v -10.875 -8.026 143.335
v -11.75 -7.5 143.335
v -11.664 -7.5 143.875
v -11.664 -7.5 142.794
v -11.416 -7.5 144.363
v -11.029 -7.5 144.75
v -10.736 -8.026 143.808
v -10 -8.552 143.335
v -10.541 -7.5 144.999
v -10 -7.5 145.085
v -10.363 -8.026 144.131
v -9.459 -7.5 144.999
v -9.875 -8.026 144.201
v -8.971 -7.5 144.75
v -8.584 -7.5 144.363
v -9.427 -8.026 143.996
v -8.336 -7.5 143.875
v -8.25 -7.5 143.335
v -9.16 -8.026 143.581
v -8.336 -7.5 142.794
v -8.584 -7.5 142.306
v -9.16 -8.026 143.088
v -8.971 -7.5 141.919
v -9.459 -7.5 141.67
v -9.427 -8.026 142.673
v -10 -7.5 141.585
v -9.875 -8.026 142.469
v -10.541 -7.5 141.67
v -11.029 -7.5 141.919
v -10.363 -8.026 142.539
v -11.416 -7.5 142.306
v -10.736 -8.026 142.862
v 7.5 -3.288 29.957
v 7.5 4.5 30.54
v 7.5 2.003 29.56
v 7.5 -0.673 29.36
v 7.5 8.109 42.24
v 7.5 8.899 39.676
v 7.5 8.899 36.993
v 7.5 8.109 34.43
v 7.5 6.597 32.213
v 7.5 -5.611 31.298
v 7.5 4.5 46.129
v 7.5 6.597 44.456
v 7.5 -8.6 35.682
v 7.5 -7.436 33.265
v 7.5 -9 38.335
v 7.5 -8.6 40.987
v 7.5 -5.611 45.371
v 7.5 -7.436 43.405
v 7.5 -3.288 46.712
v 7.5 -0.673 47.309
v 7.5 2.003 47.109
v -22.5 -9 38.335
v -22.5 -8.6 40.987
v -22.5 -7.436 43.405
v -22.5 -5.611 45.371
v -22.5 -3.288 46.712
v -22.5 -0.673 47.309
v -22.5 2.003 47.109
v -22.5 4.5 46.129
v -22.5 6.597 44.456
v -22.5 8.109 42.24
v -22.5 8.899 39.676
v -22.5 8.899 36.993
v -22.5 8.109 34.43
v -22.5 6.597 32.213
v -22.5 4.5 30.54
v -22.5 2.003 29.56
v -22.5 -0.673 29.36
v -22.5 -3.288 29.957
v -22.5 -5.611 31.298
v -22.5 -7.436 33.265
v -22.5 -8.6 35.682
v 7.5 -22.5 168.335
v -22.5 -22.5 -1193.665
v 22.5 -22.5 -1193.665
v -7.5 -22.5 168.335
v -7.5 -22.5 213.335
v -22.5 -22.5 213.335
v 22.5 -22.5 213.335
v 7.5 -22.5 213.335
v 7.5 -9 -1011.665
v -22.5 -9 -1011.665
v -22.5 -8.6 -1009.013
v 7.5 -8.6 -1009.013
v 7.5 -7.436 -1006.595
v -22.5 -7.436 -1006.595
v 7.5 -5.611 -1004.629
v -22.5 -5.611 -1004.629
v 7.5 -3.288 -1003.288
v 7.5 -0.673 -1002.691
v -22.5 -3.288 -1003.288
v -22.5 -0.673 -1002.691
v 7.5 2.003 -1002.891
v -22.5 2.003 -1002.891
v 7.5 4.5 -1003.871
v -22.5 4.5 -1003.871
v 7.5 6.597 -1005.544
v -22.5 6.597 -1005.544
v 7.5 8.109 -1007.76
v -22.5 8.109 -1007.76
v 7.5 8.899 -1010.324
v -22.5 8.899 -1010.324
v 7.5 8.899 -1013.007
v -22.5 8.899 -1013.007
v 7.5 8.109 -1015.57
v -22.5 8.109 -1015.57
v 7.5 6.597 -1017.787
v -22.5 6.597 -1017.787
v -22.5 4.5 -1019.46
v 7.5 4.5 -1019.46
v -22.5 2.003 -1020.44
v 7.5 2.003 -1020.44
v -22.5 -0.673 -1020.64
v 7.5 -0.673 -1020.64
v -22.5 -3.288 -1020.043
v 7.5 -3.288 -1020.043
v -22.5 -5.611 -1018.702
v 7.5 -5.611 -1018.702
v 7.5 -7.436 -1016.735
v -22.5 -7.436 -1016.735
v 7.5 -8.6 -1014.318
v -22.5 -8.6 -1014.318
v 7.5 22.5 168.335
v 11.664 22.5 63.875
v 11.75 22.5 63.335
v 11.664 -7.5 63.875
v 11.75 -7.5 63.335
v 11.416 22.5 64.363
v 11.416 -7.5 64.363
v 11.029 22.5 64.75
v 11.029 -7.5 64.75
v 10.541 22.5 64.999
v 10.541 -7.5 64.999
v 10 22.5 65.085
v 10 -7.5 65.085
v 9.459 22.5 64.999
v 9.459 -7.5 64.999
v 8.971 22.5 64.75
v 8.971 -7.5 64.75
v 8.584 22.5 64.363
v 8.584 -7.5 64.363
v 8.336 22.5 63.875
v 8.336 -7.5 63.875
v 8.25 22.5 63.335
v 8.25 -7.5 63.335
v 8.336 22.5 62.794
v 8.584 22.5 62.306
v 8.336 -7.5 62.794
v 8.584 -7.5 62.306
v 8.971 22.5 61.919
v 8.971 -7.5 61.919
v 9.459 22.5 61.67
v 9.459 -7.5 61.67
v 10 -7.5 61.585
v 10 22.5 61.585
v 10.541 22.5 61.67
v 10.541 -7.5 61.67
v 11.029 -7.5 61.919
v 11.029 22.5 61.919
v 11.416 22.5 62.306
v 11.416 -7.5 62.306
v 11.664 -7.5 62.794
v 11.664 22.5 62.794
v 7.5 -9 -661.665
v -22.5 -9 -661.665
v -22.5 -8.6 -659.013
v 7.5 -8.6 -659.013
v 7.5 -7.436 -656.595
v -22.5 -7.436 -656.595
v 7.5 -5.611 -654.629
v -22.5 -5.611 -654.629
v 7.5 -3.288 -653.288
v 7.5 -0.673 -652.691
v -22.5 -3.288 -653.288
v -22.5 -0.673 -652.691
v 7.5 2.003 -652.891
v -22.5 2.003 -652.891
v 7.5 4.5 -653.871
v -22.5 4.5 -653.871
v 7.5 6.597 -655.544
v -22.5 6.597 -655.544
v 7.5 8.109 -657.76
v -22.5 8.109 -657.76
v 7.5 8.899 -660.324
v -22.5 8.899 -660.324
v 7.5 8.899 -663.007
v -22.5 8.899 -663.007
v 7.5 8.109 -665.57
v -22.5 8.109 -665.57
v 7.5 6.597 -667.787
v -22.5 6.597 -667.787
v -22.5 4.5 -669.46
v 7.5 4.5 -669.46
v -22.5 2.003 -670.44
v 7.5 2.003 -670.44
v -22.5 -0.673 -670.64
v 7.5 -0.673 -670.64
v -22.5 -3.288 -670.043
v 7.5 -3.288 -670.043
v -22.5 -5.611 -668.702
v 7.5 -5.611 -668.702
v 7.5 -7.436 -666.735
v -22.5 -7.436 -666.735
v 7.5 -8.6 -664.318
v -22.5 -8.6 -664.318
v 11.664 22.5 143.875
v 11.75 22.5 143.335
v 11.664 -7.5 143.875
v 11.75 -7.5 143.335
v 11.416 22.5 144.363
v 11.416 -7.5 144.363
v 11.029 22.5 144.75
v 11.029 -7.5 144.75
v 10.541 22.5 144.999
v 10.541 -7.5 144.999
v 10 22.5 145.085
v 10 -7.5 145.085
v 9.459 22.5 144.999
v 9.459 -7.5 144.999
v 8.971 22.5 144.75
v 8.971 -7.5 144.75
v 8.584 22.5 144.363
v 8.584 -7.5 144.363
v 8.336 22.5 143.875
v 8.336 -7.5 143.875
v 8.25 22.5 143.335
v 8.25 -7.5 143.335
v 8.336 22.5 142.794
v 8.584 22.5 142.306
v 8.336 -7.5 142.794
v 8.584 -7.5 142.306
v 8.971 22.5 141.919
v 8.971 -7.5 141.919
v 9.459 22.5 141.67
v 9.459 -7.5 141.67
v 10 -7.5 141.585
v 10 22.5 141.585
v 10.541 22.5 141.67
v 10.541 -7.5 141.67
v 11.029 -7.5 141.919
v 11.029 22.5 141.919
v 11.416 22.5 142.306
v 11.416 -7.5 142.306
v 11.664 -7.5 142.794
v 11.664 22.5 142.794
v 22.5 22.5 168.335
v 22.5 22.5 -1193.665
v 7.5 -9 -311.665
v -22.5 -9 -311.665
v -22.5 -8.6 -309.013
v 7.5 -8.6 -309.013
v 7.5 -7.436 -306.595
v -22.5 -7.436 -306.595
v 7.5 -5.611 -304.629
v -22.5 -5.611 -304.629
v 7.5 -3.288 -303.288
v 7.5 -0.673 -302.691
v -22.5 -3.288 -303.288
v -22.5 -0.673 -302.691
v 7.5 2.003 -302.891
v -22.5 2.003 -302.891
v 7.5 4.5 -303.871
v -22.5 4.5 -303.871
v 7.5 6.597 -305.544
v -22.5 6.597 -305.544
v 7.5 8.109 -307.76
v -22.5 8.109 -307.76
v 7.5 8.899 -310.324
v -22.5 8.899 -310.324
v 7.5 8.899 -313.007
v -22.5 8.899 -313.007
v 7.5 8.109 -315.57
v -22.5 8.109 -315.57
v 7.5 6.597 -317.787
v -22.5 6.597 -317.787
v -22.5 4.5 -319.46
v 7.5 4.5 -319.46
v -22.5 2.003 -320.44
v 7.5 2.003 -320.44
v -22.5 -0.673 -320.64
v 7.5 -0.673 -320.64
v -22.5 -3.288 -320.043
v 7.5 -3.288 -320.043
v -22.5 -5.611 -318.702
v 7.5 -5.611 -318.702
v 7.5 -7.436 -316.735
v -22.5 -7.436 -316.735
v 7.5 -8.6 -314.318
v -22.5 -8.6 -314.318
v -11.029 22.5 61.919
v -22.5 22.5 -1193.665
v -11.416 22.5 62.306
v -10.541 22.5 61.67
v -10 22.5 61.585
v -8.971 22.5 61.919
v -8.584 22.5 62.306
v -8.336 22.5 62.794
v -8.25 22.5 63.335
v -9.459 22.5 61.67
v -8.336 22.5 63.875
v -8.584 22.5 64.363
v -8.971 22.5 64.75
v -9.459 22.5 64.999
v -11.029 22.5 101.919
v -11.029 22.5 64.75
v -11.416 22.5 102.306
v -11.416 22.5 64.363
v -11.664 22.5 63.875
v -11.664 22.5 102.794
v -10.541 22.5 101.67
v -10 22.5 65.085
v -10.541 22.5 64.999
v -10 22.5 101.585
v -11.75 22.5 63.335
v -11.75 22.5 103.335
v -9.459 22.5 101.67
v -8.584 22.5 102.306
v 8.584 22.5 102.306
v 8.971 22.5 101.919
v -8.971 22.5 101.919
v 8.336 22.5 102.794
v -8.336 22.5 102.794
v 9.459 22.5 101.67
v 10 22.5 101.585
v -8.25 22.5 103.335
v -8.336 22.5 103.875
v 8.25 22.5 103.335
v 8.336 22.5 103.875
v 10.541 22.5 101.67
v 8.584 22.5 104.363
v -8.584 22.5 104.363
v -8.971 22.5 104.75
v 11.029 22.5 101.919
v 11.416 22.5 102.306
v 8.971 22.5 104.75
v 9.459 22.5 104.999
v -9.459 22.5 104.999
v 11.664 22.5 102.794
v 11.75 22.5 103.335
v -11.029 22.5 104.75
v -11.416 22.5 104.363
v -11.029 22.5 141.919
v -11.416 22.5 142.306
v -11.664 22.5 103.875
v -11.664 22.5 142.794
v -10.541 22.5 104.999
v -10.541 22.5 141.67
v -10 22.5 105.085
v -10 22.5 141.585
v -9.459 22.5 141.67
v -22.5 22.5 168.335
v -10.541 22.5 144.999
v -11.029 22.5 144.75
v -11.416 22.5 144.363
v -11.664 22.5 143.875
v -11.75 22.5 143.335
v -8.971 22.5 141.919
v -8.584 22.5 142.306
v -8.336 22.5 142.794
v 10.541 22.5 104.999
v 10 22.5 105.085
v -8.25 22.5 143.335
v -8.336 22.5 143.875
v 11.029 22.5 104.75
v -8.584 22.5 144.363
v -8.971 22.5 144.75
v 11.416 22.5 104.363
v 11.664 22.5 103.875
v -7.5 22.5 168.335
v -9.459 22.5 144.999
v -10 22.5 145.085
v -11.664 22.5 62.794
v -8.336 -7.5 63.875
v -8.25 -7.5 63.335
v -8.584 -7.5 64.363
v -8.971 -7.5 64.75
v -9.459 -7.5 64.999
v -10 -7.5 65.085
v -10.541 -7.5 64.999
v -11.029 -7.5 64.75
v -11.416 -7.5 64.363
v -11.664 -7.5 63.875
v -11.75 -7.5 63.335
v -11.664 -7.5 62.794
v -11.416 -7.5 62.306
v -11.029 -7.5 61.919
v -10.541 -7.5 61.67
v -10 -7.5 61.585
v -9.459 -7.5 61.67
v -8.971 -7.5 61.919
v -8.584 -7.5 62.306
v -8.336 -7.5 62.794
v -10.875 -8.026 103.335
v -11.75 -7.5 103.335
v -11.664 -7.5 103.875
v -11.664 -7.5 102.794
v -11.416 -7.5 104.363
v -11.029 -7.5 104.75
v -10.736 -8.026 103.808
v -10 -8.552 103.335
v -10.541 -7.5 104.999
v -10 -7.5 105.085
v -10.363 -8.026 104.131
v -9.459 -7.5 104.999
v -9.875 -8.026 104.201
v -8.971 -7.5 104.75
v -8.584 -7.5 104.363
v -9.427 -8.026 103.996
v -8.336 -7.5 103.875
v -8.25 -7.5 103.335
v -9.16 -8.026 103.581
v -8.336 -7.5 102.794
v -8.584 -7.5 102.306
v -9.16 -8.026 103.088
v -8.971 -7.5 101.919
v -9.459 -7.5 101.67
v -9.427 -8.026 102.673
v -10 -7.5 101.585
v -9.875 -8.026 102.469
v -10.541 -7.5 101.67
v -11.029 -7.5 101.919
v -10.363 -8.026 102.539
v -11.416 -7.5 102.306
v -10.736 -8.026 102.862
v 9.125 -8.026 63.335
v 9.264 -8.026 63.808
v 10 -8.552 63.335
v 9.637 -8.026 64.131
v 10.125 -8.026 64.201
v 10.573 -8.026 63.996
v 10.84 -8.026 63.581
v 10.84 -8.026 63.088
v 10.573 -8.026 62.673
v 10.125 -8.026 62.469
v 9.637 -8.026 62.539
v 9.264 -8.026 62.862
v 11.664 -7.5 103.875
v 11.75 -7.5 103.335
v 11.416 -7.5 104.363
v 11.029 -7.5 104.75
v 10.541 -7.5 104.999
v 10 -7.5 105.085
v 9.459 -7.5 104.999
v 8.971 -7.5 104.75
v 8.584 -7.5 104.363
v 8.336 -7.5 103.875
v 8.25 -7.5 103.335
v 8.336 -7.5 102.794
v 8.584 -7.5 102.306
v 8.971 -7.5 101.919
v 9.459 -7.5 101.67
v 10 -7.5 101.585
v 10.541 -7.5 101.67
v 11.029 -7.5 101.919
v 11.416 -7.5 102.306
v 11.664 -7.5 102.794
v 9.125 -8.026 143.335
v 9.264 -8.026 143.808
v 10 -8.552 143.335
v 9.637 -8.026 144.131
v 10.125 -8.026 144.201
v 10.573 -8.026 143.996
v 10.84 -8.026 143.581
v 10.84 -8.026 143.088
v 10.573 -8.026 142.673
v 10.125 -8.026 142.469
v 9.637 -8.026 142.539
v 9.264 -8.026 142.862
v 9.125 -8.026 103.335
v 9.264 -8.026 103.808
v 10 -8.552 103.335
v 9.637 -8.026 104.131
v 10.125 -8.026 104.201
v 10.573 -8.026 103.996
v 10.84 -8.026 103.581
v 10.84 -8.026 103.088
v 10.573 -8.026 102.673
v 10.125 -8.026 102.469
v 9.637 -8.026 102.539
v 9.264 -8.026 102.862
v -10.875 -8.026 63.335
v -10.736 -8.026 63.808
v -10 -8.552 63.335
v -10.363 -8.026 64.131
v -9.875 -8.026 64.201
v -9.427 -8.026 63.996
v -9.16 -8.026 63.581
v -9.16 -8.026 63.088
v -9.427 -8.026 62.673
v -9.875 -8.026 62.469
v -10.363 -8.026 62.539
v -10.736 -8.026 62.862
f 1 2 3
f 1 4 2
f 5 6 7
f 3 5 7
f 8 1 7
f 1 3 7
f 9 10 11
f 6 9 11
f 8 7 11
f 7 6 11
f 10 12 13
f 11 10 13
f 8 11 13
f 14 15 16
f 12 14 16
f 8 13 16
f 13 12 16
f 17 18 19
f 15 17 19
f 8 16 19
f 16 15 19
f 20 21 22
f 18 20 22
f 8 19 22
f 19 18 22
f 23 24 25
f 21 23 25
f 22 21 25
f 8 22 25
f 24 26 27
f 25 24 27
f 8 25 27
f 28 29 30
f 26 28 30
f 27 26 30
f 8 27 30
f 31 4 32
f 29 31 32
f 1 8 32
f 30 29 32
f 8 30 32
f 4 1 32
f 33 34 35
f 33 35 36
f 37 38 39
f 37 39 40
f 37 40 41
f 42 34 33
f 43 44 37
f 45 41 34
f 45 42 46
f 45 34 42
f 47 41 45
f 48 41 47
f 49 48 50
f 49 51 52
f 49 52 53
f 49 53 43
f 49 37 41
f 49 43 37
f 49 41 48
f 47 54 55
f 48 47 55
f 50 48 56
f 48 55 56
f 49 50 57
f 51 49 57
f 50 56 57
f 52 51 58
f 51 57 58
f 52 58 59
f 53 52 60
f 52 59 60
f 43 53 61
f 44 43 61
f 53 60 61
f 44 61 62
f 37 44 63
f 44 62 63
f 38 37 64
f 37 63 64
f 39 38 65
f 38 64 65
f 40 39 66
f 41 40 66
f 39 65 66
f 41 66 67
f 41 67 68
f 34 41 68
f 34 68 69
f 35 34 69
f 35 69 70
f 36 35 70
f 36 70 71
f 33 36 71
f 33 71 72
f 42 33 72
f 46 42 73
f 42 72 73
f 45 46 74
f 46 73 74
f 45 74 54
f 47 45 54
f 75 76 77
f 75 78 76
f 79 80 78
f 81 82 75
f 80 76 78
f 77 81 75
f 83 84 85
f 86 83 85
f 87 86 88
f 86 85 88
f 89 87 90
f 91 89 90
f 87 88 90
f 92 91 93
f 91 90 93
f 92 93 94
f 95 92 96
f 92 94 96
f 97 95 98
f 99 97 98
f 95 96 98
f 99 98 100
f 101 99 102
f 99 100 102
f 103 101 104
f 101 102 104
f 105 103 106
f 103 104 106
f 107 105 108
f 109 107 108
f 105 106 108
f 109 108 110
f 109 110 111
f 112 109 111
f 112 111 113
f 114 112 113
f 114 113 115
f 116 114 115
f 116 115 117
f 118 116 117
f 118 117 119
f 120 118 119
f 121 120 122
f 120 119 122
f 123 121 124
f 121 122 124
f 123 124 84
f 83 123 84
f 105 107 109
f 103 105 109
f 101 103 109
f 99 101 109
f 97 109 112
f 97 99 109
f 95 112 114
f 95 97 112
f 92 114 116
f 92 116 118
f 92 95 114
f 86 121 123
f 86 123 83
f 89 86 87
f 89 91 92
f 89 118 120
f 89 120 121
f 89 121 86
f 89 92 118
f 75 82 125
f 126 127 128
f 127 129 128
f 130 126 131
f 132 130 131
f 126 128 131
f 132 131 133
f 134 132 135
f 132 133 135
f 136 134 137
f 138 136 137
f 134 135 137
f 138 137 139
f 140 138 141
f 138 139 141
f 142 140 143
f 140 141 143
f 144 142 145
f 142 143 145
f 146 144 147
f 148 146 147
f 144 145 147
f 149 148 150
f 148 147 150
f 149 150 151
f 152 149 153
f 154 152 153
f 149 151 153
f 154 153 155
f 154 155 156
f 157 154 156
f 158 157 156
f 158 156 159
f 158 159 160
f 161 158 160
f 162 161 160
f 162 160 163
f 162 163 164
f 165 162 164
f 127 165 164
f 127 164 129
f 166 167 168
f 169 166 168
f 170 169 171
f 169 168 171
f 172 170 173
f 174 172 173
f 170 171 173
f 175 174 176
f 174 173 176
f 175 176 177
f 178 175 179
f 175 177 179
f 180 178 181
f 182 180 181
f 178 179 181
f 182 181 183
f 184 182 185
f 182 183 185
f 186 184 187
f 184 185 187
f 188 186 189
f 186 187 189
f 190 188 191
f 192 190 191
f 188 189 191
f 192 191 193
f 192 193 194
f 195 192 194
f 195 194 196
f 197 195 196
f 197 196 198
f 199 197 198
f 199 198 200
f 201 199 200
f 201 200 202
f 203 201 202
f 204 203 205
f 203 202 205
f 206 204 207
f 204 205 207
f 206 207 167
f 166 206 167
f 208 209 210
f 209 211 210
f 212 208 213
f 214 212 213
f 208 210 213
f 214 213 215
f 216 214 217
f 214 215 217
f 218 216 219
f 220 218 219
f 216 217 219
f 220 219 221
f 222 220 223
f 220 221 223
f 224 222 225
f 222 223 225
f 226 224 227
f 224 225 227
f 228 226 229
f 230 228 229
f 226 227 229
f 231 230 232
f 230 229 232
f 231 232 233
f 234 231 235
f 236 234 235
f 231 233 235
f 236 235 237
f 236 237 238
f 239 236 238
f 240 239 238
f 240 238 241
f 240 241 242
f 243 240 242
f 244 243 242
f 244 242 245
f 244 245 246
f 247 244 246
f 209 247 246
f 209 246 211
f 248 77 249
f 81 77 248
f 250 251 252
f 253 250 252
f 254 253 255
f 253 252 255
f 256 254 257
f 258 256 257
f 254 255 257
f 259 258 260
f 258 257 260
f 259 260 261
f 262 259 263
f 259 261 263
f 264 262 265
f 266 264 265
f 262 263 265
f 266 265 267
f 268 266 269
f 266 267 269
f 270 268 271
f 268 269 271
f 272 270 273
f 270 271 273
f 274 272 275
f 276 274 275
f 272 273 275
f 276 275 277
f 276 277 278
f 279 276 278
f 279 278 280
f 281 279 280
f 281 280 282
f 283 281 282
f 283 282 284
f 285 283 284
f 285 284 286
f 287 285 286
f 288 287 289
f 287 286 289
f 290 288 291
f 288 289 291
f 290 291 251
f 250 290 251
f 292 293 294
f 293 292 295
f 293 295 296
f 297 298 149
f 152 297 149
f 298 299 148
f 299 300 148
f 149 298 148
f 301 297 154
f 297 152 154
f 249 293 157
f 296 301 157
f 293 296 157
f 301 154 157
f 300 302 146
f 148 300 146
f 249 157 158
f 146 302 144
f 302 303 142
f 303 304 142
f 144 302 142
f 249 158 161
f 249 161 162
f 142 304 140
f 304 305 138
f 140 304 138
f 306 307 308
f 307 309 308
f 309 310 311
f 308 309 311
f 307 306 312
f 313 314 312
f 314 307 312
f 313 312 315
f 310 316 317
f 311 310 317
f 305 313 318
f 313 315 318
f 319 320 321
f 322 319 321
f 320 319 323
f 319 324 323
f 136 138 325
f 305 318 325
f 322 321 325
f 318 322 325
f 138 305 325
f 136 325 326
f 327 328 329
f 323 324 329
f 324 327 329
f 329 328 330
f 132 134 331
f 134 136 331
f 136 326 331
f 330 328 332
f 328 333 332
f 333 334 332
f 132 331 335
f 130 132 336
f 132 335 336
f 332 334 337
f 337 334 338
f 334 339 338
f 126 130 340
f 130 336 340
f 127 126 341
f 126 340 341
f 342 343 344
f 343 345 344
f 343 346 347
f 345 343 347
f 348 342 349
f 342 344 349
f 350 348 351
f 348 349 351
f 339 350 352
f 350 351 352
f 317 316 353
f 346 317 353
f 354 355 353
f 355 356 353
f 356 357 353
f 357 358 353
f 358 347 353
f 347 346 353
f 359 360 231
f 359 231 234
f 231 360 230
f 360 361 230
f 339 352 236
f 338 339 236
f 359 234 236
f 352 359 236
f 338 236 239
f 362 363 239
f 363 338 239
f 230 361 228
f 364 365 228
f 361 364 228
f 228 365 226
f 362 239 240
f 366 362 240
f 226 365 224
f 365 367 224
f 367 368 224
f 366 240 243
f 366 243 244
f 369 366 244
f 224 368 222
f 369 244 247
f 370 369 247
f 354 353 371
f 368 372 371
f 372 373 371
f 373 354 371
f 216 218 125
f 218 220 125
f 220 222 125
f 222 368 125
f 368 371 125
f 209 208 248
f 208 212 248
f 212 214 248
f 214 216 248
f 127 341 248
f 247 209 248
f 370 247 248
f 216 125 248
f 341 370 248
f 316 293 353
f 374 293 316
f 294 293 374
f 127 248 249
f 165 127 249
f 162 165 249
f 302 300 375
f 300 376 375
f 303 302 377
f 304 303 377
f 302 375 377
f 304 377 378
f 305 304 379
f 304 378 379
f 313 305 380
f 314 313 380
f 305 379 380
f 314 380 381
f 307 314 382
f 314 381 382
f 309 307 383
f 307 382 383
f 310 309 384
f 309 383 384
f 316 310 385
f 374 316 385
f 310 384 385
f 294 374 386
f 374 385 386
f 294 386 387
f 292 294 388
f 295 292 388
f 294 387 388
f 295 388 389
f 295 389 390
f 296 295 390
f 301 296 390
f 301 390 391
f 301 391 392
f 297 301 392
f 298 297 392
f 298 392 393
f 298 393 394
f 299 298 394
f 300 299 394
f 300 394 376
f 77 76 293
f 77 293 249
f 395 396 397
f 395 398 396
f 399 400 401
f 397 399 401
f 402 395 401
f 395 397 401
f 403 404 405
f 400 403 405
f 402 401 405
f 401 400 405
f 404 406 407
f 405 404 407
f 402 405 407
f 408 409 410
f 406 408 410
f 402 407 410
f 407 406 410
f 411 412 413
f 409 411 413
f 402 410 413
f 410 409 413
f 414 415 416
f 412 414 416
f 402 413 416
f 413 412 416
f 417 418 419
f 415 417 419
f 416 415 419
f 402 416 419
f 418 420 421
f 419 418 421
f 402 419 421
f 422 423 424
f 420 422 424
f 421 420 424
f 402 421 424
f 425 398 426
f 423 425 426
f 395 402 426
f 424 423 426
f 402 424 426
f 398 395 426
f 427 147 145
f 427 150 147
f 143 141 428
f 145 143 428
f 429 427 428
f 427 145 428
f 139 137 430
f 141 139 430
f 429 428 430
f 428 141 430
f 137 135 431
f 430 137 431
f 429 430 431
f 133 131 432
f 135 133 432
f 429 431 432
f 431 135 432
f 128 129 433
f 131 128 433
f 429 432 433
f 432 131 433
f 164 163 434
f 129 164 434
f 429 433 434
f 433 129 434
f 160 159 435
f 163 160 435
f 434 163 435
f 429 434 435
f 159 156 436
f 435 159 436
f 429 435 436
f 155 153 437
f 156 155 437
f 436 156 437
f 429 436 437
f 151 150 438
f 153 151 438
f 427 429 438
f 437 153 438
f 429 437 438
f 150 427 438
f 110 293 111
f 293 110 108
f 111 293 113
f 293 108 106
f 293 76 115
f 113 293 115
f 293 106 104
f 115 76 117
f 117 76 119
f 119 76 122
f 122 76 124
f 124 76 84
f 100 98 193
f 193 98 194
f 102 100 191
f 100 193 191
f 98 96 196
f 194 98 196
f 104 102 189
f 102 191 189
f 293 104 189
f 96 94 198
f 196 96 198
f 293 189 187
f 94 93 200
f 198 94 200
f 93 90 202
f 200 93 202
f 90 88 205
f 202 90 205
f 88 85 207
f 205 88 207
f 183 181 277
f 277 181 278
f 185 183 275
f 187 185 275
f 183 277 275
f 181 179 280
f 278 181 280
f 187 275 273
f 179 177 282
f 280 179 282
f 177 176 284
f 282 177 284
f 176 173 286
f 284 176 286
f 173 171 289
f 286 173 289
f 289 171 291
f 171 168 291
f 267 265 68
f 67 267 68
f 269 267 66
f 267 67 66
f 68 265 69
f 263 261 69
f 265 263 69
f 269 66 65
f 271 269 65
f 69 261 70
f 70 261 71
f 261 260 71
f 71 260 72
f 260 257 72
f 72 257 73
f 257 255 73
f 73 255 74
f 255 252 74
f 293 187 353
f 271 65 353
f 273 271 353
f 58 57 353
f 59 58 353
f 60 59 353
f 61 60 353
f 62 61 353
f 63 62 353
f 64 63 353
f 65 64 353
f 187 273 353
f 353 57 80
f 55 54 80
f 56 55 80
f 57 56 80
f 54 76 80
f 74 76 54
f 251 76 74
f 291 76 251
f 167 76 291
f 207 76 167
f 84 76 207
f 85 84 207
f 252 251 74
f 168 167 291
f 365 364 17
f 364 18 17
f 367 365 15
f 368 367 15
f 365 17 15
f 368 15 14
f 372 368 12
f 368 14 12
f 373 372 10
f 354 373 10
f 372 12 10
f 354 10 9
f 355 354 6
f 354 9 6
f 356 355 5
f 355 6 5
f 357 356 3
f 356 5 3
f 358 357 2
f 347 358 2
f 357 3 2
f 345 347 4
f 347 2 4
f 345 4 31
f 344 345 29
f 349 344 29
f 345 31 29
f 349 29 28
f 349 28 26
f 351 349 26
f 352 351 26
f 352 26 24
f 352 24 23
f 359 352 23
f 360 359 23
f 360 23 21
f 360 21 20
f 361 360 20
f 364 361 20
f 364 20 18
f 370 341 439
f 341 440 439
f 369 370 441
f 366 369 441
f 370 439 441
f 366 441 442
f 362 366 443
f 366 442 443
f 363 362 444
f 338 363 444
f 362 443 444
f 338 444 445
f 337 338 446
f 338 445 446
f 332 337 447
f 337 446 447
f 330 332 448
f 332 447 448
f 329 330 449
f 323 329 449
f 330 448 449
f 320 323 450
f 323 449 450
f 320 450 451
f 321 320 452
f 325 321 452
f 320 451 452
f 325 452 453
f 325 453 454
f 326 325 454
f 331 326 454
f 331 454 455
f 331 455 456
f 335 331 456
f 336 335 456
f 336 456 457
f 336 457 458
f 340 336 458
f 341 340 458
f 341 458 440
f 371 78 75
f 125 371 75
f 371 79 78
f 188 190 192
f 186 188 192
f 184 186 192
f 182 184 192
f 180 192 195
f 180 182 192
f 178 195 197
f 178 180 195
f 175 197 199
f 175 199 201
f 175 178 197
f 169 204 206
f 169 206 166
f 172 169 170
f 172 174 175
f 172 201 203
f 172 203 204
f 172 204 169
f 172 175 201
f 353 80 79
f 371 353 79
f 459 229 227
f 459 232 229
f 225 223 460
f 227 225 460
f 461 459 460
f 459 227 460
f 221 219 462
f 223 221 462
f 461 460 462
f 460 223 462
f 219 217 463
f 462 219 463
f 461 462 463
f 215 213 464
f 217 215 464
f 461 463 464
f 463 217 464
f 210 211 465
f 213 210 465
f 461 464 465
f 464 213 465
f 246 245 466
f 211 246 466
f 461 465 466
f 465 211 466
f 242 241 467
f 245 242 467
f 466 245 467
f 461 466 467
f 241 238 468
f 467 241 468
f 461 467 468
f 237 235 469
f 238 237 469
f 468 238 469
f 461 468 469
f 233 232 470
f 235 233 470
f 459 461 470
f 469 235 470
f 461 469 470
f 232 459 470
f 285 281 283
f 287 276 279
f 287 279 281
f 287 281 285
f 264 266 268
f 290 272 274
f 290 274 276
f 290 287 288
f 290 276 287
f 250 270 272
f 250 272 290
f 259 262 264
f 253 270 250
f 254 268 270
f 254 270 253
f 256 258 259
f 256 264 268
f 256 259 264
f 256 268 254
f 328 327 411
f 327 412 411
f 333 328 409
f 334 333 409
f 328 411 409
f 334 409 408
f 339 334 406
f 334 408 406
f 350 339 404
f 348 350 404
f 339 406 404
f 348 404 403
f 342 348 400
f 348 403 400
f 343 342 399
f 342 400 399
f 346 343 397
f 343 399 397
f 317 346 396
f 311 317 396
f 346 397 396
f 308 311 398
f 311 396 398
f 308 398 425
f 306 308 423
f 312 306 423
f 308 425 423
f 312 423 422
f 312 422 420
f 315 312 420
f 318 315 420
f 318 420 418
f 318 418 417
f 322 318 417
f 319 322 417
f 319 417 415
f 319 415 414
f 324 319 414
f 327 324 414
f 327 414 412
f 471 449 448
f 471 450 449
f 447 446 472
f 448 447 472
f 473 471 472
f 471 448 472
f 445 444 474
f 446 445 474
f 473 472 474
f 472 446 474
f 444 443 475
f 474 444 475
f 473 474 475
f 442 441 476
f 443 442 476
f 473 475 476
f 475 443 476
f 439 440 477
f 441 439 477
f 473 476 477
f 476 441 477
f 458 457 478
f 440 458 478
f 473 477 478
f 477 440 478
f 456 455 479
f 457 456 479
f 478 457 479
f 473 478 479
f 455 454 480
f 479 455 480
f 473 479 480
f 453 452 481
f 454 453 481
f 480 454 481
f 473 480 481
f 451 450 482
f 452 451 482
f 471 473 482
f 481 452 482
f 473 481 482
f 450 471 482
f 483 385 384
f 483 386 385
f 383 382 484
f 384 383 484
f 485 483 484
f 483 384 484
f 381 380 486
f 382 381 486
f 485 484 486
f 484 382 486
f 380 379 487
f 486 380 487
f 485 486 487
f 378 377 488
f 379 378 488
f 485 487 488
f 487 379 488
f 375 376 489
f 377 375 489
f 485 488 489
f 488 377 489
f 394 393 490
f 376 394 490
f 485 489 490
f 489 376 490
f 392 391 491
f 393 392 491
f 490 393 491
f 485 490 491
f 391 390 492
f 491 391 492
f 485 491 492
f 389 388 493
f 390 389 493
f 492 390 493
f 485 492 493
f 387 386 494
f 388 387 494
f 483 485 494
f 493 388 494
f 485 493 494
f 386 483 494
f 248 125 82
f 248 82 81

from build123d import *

# Parameters (mm, degrees)
F0_W     = 45
F0_H     = 1407
F1_DEPTH = 22.5
F3_SIZE2 = 44.99999
F3_SIZE  = 44.99999
F2_W     = 15
F2_H     = 45
F4_DEPTH = 45
F5_R     = 9
F6_DEPTH = 30
F9_D     = 3.5
F9_DEPTH = 30
F9_TIP   = 1.0515060833


# Not quite as in the source:
# - a fillet or chamfer is up to 0.001 mm smaller than in the source, because OpenCascade refuses the exact size


with BuildPart() as f1:
    # F0 (on Front) → F1 (new body, symmetric)
    with BuildSketch(Plane.XZ):
        with Locations((0, -490.1653682211)):
            Rectangle(F0_W, F0_H)
    extrude(amount=F1_DEPTH, both=True)

    # F3 (size 45 and 45 in the source; OpenCascade refuses exactly that, so slightly less here)
    f3_edges = [f1.edges().sort_by_distance(p)[0] for p in [
        (0, 22.5, 213.334632),
    ]]
    chamfer(f3_edges, length=F3_SIZE, length2=F3_SIZE2)

    # F2 (on face) → F4 (cut)
    with BuildSketch(Plane.XY.offset(213.3346317789)):
        Rectangle(F2_W, F2_H)
    extrude(amount=-F4_DEPTH, mode=Mode.SUBTRACT)

    # F5 (on face) → F6 (cut)
    with BuildSketch(Plane(origin=(-22.5, 0, 0), x_dir=(0, -1, 0), z_dir=(-1, 0, 0))):
        with Locations((0, 38.3346317789)):
            Circle(F5_R)
        with Locations((0, -311.6653682211)):
            Circle(F5_R)
        with Locations((0, -661.6653682211)):
            Circle(F5_R)
        with Locations((0, -1011.6653682211)):
            Circle(F5_R)
    extrude(amount=-F6_DEPTH, mode=Mode.SUBTRACT)

    # F9
    with Locations(Plane(origin=(0, 22.5, 0), x_dir=(-1, 0, 0), z_dir=(0, 1, 0))):
        with Locations((-10, 103.3346317789), (-10, 63.3346317789), (10, 63.3346317789), (10, 103.3346317789), (10, 143.3346317789), (-10, 143.3346317789)):
            Hole(F9_D / 2, depth=F9_DEPTH)
            with Locations((0, 0, -(F9_DEPTH + F9_TIP / 2))):  # 118° drill point
                Cone(0, F9_D / 2, F9_TIP, mode=Mode.SUBTRACT)


solid = f1.part
